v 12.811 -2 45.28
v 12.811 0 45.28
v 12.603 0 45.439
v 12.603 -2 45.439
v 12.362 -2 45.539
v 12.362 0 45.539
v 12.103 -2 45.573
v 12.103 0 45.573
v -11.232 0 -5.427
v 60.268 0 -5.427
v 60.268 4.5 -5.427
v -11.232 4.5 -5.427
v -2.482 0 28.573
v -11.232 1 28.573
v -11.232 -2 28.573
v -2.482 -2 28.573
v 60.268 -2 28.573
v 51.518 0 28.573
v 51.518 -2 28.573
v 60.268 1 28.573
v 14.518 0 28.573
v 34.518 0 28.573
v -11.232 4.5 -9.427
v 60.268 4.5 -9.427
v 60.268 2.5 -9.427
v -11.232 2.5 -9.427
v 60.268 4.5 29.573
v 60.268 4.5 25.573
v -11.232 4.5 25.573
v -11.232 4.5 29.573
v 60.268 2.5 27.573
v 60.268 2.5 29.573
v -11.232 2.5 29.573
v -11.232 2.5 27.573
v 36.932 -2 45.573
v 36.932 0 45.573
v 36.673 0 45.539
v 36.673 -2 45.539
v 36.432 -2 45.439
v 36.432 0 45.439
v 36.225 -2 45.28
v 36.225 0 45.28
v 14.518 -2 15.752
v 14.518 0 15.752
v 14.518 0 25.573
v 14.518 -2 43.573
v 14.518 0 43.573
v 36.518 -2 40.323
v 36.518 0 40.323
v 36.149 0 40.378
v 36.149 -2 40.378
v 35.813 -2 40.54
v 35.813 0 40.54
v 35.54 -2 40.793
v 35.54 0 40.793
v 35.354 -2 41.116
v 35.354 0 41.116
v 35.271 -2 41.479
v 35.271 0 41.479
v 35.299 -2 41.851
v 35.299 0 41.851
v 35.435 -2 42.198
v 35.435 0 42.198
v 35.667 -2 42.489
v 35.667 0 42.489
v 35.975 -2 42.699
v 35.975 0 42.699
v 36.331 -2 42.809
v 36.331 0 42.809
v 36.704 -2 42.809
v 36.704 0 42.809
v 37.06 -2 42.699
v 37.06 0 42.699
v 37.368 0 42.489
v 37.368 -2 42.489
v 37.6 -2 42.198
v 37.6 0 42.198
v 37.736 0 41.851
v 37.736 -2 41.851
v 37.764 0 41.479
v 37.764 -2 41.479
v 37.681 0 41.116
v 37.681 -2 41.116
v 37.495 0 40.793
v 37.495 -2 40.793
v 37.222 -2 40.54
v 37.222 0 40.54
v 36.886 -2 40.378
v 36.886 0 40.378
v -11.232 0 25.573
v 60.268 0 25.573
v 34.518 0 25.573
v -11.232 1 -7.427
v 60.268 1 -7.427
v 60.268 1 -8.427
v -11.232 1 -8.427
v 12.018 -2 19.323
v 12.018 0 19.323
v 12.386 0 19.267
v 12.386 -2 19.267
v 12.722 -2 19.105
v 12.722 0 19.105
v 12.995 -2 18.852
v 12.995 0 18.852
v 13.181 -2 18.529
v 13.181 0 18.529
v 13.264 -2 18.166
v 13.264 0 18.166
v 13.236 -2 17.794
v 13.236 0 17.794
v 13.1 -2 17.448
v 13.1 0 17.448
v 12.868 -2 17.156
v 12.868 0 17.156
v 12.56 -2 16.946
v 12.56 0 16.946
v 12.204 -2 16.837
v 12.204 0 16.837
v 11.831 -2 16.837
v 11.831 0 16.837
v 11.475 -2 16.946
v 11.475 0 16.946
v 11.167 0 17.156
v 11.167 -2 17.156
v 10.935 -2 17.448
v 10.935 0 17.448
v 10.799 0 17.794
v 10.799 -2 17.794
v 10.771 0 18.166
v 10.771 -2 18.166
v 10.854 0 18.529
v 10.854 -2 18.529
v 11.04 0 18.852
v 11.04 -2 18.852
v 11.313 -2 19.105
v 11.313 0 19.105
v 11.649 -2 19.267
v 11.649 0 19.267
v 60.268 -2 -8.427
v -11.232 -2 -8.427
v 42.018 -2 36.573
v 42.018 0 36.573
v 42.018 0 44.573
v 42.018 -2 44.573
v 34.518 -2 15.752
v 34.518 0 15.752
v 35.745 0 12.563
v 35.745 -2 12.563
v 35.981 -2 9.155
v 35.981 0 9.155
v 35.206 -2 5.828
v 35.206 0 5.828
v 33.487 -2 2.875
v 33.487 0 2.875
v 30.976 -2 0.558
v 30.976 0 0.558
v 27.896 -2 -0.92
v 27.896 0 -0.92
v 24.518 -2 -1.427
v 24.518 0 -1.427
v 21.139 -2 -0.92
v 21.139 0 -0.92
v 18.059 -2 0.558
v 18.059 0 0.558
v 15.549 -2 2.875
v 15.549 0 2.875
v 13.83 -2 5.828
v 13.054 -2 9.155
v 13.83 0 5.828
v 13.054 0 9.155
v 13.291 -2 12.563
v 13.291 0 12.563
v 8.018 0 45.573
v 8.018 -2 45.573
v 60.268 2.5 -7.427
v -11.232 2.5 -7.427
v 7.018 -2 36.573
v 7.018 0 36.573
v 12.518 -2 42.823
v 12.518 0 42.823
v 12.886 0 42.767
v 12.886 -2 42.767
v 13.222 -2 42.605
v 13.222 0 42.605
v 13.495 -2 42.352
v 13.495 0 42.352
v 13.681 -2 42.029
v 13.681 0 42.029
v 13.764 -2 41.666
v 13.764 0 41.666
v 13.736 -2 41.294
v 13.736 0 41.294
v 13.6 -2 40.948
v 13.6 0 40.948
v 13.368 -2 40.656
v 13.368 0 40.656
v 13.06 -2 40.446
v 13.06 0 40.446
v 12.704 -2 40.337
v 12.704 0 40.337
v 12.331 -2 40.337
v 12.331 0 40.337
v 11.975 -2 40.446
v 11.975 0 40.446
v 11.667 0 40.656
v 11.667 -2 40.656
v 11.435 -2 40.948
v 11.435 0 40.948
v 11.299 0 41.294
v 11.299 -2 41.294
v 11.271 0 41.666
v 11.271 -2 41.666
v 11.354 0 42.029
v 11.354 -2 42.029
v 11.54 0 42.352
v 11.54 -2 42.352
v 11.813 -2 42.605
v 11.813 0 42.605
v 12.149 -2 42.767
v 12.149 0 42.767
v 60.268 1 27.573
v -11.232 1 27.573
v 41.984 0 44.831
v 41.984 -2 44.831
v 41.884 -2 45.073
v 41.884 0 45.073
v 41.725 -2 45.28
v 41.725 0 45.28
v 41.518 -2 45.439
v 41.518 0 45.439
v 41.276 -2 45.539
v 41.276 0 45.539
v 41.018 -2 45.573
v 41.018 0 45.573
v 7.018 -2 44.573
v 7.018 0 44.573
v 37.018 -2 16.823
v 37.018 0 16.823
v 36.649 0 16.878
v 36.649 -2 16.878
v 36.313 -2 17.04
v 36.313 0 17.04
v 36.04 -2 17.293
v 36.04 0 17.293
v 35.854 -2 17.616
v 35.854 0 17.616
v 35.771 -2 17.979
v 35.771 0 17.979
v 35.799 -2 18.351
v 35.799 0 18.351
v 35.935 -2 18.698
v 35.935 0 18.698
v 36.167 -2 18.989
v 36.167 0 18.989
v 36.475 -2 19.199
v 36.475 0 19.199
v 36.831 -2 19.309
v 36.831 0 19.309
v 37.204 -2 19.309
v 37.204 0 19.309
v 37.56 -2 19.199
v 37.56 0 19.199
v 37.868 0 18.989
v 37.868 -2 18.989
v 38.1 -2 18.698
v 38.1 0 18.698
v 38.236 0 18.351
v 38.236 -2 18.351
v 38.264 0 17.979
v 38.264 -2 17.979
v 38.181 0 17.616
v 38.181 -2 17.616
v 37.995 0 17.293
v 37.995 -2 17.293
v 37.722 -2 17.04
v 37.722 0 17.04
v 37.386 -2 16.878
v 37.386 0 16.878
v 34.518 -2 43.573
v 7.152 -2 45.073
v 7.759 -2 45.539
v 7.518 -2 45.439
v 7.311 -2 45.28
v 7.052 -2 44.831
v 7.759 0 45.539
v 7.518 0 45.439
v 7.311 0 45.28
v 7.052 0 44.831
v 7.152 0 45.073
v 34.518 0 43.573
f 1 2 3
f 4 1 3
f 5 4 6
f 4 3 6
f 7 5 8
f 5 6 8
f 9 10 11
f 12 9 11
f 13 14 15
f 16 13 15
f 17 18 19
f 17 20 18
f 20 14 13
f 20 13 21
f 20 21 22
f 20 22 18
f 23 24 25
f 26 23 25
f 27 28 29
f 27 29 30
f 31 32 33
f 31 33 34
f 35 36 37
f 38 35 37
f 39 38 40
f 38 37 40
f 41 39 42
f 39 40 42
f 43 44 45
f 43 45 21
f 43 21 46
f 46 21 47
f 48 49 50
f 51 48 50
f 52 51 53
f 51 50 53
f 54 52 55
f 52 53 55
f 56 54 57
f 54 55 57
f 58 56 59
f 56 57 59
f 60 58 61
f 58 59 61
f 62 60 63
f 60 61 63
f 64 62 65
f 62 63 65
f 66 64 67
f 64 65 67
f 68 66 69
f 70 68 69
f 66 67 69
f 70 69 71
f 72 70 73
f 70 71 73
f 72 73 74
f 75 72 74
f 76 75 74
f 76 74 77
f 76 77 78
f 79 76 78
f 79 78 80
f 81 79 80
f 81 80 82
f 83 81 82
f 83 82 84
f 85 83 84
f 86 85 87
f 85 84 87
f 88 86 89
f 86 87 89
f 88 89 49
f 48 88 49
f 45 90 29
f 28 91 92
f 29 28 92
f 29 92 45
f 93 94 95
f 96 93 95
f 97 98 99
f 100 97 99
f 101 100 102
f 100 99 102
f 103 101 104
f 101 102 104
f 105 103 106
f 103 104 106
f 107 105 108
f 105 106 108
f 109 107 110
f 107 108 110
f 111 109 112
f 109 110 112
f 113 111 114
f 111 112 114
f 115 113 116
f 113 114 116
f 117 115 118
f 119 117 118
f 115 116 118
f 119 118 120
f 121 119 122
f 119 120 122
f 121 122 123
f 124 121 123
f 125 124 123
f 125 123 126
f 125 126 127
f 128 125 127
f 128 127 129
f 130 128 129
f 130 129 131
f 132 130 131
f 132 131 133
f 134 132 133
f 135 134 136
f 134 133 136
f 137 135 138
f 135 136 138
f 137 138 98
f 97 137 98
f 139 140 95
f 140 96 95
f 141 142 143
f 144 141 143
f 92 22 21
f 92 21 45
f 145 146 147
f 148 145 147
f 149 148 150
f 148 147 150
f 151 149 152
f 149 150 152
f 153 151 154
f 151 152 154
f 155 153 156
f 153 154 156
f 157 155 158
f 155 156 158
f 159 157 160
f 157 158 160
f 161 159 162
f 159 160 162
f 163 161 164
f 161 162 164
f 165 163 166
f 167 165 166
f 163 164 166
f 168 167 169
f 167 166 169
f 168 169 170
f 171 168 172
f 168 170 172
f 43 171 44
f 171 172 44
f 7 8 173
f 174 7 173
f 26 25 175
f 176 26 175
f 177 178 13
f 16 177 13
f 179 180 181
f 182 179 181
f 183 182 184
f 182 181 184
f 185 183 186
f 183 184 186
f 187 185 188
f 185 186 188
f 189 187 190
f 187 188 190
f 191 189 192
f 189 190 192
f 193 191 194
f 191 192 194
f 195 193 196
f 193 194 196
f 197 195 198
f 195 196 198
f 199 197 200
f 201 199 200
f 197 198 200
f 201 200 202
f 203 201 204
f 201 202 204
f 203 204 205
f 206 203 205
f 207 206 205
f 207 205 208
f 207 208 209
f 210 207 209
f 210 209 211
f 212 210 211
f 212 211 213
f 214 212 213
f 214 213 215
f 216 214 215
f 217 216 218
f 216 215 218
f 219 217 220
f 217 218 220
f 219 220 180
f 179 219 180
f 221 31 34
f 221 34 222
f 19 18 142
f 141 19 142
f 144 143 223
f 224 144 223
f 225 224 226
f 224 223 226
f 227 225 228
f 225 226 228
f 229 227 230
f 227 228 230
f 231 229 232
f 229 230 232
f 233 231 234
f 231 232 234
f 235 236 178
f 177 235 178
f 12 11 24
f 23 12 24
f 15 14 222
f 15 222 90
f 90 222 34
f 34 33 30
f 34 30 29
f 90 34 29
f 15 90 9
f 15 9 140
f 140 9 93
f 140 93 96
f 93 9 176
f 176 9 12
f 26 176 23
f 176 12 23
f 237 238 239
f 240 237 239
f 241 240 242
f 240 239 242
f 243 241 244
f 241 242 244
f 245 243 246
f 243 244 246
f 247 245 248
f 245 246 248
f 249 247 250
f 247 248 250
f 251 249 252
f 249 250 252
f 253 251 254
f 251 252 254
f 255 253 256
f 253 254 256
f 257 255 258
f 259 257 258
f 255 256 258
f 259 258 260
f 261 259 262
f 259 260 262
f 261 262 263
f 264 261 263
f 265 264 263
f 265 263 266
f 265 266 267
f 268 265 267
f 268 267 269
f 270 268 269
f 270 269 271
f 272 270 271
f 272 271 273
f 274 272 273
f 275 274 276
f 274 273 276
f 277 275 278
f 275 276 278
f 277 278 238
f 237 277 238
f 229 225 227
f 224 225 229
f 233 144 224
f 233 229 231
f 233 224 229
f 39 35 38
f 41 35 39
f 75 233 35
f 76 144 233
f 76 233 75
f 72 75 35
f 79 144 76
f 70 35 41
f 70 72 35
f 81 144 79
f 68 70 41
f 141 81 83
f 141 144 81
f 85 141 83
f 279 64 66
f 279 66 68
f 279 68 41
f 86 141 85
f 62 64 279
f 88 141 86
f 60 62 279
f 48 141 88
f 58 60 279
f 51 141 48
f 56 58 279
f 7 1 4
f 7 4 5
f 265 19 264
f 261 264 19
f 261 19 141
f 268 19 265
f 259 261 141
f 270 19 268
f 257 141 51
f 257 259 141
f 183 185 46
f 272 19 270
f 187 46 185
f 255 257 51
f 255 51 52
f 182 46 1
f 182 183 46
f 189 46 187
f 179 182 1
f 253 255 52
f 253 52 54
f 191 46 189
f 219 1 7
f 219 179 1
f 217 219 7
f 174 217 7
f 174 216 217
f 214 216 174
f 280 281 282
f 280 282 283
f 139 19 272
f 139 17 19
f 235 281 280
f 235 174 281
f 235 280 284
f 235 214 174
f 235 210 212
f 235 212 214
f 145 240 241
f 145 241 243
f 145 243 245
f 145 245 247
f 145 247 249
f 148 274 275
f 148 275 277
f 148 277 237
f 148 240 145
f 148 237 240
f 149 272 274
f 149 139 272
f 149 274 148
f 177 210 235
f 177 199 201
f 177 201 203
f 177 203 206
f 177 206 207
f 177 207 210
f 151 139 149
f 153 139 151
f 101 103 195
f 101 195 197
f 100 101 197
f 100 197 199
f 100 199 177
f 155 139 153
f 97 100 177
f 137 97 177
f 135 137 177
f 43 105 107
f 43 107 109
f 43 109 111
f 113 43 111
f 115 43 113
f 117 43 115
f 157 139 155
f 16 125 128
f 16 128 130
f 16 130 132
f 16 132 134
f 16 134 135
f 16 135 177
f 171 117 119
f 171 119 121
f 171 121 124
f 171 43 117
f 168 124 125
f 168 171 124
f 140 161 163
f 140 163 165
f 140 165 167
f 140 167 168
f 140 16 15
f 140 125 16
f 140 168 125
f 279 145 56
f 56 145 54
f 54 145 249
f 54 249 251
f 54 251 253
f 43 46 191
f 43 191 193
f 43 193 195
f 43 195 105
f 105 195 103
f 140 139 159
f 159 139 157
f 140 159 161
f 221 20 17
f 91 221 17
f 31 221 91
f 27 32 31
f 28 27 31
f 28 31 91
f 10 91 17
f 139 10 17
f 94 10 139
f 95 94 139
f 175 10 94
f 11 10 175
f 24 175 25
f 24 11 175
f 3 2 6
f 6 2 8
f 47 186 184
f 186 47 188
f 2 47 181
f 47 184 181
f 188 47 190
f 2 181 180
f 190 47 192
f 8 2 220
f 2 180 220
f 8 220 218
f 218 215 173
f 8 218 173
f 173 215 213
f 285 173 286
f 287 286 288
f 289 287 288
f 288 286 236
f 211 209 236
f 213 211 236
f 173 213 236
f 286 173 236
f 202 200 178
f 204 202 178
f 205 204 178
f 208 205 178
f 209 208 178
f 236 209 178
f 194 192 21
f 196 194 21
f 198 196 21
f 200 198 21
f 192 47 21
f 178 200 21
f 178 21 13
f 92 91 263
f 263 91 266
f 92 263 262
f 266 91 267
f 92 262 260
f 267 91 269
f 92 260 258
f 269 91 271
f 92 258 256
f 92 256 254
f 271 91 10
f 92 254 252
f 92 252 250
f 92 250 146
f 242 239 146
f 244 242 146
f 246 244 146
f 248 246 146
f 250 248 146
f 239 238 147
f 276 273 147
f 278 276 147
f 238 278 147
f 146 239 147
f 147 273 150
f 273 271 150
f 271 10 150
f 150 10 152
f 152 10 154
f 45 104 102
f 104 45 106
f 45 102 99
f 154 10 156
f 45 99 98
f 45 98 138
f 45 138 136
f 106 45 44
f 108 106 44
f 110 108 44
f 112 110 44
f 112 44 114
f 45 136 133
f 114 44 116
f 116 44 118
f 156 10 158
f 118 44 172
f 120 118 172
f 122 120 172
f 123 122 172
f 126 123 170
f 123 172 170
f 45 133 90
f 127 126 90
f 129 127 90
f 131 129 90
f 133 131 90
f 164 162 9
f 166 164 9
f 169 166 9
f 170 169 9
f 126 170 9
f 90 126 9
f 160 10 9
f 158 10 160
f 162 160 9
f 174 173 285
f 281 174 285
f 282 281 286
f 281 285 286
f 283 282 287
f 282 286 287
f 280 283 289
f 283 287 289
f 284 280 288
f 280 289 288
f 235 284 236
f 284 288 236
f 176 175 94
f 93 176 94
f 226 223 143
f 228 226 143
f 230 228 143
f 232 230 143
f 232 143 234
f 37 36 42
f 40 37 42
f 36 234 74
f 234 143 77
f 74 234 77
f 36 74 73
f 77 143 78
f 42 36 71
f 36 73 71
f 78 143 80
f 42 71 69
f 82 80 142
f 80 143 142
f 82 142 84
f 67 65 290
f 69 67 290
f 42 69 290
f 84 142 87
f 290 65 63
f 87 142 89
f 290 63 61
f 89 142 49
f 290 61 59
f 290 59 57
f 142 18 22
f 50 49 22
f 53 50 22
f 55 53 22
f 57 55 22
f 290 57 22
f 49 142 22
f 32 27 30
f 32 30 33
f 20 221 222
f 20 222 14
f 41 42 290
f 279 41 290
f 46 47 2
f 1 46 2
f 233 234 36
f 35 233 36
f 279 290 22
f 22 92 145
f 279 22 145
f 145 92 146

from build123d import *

# Parameters (mm, degrees)
CROQUIS1_R              = 1.25
SALIENTE_EXTRUIR1_DEPTH = 2
SALIENTE_EXTRUIR2_DEPTH = 71.5


with BuildPart() as part:
    # Croquis1 → Saliente-Extruir1 (new body)
    with BuildSketch(Plane(origin=(0, 0, 0), x_dir=(1, 0, 0), z_dir=(0, 1, 0))):
        with BuildLine():
            Line((36.224750286, -45.279704968), (34.517643505, -43.572598187))
            Line((34.517643505, -43.572598187), (34.517643505, -15.751506533))
            ThreePointArc((34.517643505, -15.751506533), (24.517643505, 1.427401813), (14.517643505, -15.751506533))
            Line((14.517643505, -15.751506533), (14.517643505, -43.572598187))
            Line((14.517643505, -43.572598187), (12.810536723, -45.279704968))
            ThreePointArc((12.810536723, -45.279704968), (12.486113375, -45.49647772), (12.103429942, -45.572598187))
            Line((12.103429942, -45.572598187), (8.017643505, -45.572598187))
            ThreePointArc((8.017643505, -45.572598187), (7.310536723, -45.279704968), (7.017643505, -44.572598187))
            Line((7.017643505, -44.572598187), (7.017643505, -36.572598187))
            Line((7.017643505, -36.572598187), (-2.482356495, -28.572598187))
            Line((-2.482356495, -28.572598187), (-11.232356495, -28.572598187))
            Line((-11.232356495, -28.572598187), (-11.232356495, 8.427401813))
            Line((-11.232356495, 8.427401813), (60.267643505, 8.427401813))
            Line((60.267643505, 8.427401813), (60.267643505, -28.572598187))
            Line((60.267643505, -28.572598187), (51.517643505, -28.572598187))
            Line((51.517643505, -28.572598187), (42.017643505, -36.572598187))
            Line((42.017643505, -36.572598187), (42.017643505, -44.572598187))
            ThreePointArc((42.017643505, -44.572598187), (41.724750286, -45.279704968), (41.017643505, -45.572598187))
            Line((41.017643505, -45.572598187), (36.931857067, -45.572598187))
            ThreePointArc((36.931857067, -45.572598187), (36.549173635, -45.49647772), (36.224750286, -45.279704968))
        make_face()
        with Locations(Location((37.017643505, -18.072598187, 0), (0, 0, 90))):
            Circle(CROQUIS1_R, mode=Mode.SUBTRACT)
        with Locations(Location((36.517643505, -41.572598187, 0), (0, 0, 90))):
            Circle(CROQUIS1_R, mode=Mode.SUBTRACT)
        with Locations(Location((12.517643505, -41.572598187, 0), (0, 0, 270))):
            Circle(CROQUIS1_R, mode=Mode.SUBTRACT)
        with Locations(Location((12.017643505, -18.072598187, 0), (0, 0, 270))):
            Circle(CROQUIS1_R, mode=Mode.SUBTRACT)
    extrude(amount=-SALIENTE_EXTRUIR1_DEPTH)

    # Croquis3 → Saliente-Extruir2 (add)
    with BuildSketch(Plane(origin=(60.267643505, 0, 0), x_dir=(0, 0, -1), z_dir=(1, 0, 0))):
        Polygon((-25.572598187, 0), (-25.572598187, 4.5), (-29.572598187, 4.5), (-29.572598187, 2.5), (-27.572598187, 2.5), (-27.572598187, 1), (-28.572598187, 1), (-28.572598187, 0), align=None)
        Polygon((5.427401813, 4.5), (9.427401813, 4.5), (9.427401813, 2.5), (7.427401813, 2.5), (7.427401813, 1), (8.427401813, 1), (8.427401813, 0), (5.427401813, 0), align=None)
    extrude(amount=-SALIENTE_EXTRUIR2_DEPTH)


solid = part.part
